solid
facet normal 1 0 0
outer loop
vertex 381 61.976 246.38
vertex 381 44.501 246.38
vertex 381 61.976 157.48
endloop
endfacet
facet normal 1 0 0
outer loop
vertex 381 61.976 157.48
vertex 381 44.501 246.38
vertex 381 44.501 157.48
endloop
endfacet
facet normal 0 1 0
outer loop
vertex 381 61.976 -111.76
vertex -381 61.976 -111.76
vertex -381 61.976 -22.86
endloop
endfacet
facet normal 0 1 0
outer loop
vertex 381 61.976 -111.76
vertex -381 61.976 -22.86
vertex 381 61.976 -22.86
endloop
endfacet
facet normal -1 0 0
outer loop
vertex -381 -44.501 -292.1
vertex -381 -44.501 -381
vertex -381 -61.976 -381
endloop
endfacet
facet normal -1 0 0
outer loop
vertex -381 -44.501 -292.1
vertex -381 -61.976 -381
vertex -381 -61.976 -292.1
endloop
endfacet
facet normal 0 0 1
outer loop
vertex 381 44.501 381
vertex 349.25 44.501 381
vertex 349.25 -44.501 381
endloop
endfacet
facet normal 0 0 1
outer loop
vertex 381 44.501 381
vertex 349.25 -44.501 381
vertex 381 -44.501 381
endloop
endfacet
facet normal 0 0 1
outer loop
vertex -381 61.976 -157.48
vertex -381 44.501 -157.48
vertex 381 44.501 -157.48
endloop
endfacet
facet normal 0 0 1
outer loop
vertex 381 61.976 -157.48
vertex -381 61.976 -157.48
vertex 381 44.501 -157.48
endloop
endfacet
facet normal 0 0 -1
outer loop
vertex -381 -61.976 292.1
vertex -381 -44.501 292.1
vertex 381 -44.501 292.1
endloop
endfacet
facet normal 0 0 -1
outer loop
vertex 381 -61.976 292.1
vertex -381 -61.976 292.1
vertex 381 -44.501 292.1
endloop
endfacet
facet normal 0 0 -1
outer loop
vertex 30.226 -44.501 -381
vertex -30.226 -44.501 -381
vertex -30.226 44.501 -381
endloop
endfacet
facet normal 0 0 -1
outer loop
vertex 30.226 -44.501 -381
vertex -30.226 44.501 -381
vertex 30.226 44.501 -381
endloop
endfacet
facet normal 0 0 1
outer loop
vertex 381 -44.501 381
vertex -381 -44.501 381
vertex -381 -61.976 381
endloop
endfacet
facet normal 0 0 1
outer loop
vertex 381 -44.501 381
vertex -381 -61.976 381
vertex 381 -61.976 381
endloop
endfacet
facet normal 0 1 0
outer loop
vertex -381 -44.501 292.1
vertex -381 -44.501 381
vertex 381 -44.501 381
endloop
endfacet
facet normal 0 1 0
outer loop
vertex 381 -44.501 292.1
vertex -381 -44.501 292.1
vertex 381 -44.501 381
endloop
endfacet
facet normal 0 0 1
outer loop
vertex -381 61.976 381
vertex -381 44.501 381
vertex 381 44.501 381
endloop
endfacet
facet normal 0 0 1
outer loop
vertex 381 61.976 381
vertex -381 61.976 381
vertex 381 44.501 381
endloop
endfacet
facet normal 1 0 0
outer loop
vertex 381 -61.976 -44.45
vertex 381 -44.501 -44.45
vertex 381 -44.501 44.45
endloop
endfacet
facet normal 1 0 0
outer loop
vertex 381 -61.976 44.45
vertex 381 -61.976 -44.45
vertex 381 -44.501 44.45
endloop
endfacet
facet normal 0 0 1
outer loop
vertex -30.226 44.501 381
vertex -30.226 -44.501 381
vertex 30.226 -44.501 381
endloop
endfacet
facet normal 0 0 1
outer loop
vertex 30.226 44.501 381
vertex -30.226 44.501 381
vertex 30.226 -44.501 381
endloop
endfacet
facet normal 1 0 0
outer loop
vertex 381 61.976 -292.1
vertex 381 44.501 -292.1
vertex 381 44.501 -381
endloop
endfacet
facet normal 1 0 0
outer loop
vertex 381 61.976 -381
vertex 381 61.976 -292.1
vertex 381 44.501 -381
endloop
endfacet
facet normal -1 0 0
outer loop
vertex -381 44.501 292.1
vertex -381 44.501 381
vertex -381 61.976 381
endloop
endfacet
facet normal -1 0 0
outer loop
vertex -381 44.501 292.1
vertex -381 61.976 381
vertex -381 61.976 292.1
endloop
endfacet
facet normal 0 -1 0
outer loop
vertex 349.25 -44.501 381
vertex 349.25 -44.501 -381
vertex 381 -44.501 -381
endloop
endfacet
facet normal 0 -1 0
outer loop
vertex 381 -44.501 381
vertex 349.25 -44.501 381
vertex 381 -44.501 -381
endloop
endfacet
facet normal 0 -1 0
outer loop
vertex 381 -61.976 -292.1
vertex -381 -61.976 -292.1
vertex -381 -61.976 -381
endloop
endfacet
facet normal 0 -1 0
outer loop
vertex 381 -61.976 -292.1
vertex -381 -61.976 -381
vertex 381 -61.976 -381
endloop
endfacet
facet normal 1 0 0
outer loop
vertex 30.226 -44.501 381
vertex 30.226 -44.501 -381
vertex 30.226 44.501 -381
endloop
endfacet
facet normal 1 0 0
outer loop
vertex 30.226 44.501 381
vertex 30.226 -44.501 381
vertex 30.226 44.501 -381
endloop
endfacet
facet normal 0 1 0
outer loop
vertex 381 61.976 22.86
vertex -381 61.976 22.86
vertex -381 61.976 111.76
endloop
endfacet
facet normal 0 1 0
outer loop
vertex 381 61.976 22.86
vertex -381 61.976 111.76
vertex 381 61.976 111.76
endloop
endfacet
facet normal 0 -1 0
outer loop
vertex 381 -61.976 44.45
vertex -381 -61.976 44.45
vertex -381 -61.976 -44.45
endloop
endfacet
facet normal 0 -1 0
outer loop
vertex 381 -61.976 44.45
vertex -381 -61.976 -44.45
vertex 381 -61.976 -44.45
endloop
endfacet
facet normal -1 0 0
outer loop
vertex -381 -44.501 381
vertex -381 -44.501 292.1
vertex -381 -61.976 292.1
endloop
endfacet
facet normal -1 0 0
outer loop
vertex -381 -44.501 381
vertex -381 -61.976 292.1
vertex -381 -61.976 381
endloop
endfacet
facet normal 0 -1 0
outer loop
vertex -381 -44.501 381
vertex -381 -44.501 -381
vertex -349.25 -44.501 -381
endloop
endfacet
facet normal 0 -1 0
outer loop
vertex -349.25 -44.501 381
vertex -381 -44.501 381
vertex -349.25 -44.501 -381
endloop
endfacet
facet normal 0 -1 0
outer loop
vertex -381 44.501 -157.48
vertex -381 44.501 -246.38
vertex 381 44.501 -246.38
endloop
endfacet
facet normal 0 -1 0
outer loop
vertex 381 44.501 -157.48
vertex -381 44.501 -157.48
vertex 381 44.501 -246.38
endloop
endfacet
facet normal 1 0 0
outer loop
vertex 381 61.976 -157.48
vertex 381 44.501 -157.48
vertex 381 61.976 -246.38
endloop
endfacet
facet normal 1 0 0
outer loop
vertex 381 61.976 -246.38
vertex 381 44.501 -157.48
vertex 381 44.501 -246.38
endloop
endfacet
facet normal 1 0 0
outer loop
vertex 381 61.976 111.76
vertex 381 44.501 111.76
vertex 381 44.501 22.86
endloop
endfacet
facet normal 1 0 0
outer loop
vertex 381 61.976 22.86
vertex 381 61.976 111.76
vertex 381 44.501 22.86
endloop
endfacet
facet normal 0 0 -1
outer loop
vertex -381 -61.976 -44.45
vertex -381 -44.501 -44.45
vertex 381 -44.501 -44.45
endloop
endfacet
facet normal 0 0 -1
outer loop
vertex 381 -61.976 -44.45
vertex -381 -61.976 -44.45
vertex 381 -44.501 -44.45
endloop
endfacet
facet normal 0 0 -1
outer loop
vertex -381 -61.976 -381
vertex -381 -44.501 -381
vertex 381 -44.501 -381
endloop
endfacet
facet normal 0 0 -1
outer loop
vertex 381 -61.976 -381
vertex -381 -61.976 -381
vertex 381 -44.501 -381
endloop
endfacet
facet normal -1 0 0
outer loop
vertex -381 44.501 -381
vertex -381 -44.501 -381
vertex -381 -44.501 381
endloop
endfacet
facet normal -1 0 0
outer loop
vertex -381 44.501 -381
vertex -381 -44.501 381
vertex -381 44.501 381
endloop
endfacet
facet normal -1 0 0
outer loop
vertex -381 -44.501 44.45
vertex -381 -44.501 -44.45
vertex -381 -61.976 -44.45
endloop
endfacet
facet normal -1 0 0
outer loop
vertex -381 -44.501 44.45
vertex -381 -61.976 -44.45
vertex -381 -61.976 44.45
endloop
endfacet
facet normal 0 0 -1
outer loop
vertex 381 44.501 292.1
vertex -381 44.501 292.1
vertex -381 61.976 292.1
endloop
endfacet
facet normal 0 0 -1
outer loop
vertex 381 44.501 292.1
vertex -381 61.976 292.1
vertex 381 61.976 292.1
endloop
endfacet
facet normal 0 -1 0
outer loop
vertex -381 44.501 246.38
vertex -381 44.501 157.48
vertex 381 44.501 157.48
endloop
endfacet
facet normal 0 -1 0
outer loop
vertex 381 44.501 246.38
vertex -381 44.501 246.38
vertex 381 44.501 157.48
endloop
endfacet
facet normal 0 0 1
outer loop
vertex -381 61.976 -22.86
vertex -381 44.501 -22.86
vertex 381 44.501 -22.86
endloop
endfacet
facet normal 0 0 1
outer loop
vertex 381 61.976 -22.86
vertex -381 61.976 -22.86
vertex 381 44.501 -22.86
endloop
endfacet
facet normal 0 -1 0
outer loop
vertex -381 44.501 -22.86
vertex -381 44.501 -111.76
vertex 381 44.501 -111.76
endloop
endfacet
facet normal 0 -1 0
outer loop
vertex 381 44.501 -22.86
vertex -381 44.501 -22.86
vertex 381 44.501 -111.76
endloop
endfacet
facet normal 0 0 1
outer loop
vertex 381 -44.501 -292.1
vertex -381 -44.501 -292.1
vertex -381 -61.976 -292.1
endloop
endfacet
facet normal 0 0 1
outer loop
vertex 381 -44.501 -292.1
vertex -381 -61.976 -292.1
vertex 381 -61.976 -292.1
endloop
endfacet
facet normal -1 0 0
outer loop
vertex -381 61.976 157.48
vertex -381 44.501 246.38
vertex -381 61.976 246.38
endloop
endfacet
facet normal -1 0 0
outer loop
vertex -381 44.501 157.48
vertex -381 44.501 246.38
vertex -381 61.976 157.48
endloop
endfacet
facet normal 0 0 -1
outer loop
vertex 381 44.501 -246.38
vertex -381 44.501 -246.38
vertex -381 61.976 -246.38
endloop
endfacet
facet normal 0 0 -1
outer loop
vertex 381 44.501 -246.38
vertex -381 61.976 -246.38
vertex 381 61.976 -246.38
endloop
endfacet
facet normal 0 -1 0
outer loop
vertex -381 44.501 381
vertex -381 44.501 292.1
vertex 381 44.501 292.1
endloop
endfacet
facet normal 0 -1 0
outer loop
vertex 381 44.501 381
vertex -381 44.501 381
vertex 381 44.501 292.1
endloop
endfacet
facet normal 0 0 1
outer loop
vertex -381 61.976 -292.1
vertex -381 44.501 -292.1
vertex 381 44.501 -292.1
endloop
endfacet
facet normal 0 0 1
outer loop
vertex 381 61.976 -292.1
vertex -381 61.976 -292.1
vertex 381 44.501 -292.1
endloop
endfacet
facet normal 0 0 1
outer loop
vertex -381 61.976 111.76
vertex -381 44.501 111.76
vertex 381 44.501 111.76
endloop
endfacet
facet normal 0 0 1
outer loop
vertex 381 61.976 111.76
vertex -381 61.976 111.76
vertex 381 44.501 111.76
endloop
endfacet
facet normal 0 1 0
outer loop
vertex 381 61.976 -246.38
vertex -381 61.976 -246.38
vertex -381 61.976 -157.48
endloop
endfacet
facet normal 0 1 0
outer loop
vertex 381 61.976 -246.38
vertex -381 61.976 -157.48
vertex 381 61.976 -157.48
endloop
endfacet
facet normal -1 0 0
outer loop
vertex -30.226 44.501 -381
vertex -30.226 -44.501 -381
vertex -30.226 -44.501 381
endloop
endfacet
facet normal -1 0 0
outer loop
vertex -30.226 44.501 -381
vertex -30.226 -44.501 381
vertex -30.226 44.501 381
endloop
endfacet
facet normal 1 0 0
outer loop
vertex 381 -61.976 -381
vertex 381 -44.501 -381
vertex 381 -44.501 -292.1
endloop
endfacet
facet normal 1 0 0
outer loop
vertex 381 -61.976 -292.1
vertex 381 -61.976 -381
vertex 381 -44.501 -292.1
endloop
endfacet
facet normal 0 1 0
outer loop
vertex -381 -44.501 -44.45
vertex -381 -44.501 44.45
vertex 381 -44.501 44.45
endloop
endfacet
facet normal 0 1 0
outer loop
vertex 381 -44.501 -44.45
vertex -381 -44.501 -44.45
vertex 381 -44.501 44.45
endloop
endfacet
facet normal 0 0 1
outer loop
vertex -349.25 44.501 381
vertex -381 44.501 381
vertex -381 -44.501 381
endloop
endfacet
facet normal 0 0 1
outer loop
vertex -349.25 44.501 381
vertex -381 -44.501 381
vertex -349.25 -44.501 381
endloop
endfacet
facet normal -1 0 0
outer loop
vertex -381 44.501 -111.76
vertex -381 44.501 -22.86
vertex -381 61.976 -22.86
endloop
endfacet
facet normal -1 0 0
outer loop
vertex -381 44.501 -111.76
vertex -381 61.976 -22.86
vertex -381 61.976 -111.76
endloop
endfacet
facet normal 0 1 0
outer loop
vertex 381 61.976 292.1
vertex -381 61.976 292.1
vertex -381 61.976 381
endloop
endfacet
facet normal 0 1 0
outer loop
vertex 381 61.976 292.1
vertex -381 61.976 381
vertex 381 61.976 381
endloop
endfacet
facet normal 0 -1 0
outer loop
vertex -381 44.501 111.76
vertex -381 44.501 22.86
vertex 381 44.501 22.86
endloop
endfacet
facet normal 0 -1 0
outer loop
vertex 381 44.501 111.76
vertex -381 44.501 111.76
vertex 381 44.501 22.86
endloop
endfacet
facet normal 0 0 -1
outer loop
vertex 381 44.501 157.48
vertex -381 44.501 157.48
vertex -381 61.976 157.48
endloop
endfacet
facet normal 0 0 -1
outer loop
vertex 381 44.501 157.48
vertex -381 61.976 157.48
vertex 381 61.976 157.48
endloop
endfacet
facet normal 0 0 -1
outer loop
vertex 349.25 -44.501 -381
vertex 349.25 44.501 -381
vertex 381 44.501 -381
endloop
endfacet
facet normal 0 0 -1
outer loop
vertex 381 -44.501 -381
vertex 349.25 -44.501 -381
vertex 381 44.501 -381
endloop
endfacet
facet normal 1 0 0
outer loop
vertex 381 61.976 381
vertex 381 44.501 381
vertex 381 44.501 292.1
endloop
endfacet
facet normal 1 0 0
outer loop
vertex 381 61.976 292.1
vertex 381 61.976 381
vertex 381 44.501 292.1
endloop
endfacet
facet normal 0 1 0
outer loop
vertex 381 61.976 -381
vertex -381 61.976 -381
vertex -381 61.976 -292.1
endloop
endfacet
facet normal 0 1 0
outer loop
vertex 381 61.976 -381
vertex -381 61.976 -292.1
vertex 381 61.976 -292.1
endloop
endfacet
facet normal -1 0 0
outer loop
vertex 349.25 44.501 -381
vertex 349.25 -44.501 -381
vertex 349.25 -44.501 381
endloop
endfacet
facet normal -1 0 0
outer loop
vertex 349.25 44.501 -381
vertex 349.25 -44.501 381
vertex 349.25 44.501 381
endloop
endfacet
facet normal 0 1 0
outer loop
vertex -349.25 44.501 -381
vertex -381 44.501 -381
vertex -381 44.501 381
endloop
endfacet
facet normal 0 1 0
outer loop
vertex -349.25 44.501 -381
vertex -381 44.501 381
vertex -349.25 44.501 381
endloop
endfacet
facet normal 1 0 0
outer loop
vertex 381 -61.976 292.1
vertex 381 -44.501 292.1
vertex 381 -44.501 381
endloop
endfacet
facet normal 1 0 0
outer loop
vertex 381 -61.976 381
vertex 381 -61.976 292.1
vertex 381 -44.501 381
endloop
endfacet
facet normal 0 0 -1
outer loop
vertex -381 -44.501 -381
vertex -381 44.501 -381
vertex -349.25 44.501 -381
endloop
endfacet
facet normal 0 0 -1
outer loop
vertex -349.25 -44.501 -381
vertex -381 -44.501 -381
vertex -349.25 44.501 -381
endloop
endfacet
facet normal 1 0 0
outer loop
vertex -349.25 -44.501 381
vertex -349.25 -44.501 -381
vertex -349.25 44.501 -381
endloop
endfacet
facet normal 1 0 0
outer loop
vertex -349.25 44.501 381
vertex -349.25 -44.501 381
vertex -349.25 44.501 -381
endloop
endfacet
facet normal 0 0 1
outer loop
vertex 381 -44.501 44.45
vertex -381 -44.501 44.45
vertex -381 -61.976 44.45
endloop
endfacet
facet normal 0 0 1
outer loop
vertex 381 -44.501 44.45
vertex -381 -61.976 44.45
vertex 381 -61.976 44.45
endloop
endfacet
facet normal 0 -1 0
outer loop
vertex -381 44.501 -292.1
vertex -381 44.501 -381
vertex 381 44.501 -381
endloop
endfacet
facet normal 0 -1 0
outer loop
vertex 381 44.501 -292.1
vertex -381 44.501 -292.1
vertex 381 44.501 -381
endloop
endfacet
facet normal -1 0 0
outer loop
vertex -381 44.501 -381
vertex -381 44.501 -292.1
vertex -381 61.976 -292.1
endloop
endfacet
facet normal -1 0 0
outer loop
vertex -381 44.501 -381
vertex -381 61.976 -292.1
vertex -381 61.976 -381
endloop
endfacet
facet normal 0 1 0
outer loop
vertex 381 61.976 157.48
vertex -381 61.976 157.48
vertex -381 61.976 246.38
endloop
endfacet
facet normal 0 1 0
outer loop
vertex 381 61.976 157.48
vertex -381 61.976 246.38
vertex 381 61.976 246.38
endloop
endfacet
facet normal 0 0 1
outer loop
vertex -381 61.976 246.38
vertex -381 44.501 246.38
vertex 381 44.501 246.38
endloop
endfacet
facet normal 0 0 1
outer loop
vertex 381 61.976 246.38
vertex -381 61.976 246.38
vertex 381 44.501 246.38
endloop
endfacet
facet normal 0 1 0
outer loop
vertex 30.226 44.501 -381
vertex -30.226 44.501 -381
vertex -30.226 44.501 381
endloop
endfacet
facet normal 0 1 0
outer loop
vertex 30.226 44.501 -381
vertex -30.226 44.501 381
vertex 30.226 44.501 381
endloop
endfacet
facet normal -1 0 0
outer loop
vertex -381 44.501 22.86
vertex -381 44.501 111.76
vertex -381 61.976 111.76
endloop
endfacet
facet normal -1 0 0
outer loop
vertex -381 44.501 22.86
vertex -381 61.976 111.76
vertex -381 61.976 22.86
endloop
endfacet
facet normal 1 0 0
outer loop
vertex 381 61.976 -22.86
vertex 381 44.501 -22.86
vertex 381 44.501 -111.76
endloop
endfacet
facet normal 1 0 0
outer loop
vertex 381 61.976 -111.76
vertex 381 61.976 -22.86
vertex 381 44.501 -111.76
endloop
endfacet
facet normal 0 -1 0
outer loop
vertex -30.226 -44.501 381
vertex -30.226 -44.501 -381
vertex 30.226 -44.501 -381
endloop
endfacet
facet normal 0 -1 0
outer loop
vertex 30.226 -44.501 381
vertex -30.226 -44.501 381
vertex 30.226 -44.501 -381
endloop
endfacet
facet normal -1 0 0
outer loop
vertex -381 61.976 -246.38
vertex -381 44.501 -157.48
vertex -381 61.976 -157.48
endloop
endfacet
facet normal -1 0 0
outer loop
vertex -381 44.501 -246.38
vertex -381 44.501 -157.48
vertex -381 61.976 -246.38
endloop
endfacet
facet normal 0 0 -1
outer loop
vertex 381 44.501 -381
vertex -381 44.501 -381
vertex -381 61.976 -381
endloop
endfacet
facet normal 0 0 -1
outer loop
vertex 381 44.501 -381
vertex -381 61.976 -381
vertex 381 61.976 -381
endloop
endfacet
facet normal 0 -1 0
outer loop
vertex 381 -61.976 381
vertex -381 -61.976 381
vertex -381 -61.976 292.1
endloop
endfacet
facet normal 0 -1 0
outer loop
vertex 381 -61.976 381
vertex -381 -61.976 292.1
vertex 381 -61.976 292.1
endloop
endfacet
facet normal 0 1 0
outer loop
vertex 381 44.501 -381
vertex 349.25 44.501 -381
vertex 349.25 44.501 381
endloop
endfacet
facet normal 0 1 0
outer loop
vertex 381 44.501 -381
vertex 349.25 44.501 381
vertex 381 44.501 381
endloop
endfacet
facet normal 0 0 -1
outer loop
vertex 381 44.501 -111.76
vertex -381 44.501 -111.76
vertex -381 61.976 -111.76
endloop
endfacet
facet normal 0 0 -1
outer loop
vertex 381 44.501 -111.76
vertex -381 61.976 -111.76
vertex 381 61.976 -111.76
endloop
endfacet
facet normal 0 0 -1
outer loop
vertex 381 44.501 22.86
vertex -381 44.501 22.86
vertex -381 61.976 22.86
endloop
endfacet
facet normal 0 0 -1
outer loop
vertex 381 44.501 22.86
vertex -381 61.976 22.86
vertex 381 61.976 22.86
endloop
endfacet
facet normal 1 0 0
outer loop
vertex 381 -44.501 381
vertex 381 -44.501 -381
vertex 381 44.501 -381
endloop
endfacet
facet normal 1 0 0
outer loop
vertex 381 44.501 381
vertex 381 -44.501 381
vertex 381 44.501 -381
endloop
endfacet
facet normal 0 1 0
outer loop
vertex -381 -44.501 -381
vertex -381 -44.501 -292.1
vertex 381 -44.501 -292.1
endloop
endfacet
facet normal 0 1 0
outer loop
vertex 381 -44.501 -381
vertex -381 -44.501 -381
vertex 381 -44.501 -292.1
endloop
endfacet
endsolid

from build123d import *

# Parameters (mm, degrees)
BOSS_EXTRUDE1_DEPTH        = 381
BOSS_EXTRUDE1_DEPTH_BACK   = 381
SKETCH3_W                  = 31.75
SKETCH3_H                  = 89.0016
BOSS_EXTRUDE1_2_DEPTH      = 381
BOSS_EXTRUDE1_2_DEPTH_BACK = 381
SKETCH3_W_2                = 60.452
BOSS_EXTRUDE1_3_DEPTH      = 381
BOSS_EXTRUDE1_3_DEPTH_BACK = 381
SKETCH4_W                  = 762
SKETCH4_H                  = 88.9
BOSS_EXTRUDE2_DEPTH        = 17.4752
BOSS_EXTRUDE2_2_DEPTH      = 17.4752
BOSS_EXTRUDE2_3_DEPTH      = 17.4752
BOSS_EXTRUDE2_4_DEPTH      = 17.4752
BOSS_EXTRUDE2_5_DEPTH      = 17.4752
BOSS_EXTRUDE2_6_DEPTH      = 17.4752
SKETCH5_W                  = 762
SKETCH5_H                  = 88.9
BOSS_EXTRUDE3_DEPTH        = 17.4752
BOSS_EXTRUDE3_2_DEPTH      = 17.4752
BOSS_EXTRUDE3_3_DEPTH      = 17.4752


with BuildPart() as part:
    # Sketch3 → Boss-Extrude1 (new, two sides: drawn at the far end of the back side and taken through both)
    with BuildSketch(Plane.XY.offset(-BOSS_EXTRUDE1_DEPTH_BACK)):
        with Locations((-365.125, 0)):
            Rectangle(SKETCH3_W, SKETCH3_H)
    extrude(amount=BOSS_EXTRUDE1_DEPTH + BOSS_EXTRUDE1_DEPTH_BACK)


with BuildPart() as body_2:
    # Sketch3 → Boss-Extrude1 2 (new, two sides: drawn at the far end of the back side and taken through both)
    with BuildSketch(Plane.XY.offset(-BOSS_EXTRUDE1_2_DEPTH_BACK)):
        Rectangle(SKETCH3_W_2, SKETCH3_H)
    extrude(amount=BOSS_EXTRUDE1_2_DEPTH + BOSS_EXTRUDE1_2_DEPTH_BACK)


with BuildPart() as body_3:
    # Sketch3 → Boss-Extrude1 3 (new, two sides: drawn at the far end of the back side and taken through both)
    with BuildSketch(Plane.XY.offset(-BOSS_EXTRUDE1_3_DEPTH_BACK)):
        with Locations((365.125, 0)):
            Rectangle(SKETCH3_W, SKETCH3_H)
    extrude(amount=BOSS_EXTRUDE1_3_DEPTH + BOSS_EXTRUDE1_3_DEPTH_BACK)


with BuildPart() as body_4:
    # Sketch4 → Boss-Extrude2 (new body)
    with BuildSketch(Plane(origin=(0, 44.5008, 0), x_dir=(1, 0, 0), z_dir=(0, 1, 0))):
        with Locations((0, -336.55)):
            Rectangle(SKETCH4_W, SKETCH4_H)
    extrude(amount=BOSS_EXTRUDE2_DEPTH)


with BuildPart() as body_5:
    # Sketch4 → Boss-Extrude2 2 (new body)
    with BuildSketch(Plane(origin=(0, 44.5008, 0), x_dir=(1, 0, 0), z_dir=(0, 1, 0))):
        with Locations((0, -201.93)):
            Rectangle(SKETCH4_W, SKETCH4_H)
    extrude(amount=BOSS_EXTRUDE2_2_DEPTH)


with BuildPart() as body_6:
    # Sketch4 → Boss-Extrude2 3 (new body)
    with BuildSketch(Plane(origin=(0, 44.5008, 0), x_dir=(1, 0, 0), z_dir=(0, 1, 0))):
        with Locations((0, -67.31)):
            Rectangle(SKETCH4_W, SKETCH4_H)
    extrude(amount=BOSS_EXTRUDE2_3_DEPTH)


with BuildPart() as body_7:
    # Sketch4 → Boss-Extrude2 4 (new body)
    with BuildSketch(Plane(origin=(0, 44.5008, 0), x_dir=(1, 0, 0), z_dir=(0, 1, 0))):
        with Locations((0, 67.31)):
            Rectangle(SKETCH4_W, SKETCH4_H)
    extrude(amount=BOSS_EXTRUDE2_4_DEPTH)


with BuildPart() as body_8:
    # Sketch4 → Boss-Extrude2 5 (new body)
    with BuildSketch(Plane(origin=(0, 44.5008, 0), x_dir=(1, 0, 0), z_dir=(0, 1, 0))):
        with Locations((0, 201.93)):
            Rectangle(SKETCH4_W, SKETCH4_H)
    extrude(amount=BOSS_EXTRUDE2_5_DEPTH)


with BuildPart() as body_9:
    # Sketch4 → Boss-Extrude2 6 (new body)
    with BuildSketch(Plane(origin=(0, 44.5008, 0), x_dir=(1, 0, 0), z_dir=(0, 1, 0))):
        with Locations((0, 336.55)):
            Rectangle(SKETCH4_W, SKETCH4_H)
    extrude(amount=BOSS_EXTRUDE2_6_DEPTH)


with BuildPart() as body_10:
    # Sketch5 → Boss-Extrude3 (new body)
    with BuildSketch(Plane.XZ.offset(44.5008)):
        with Locations((0, 336.55)):
            Rectangle(SKETCH5_W, SKETCH5_H)
    extrude(amount=BOSS_EXTRUDE3_DEPTH)


with BuildPart() as body_11:
    # Sketch5 → Boss-Extrude3 2 (new body)
    with BuildSketch(Plane.XZ.offset(44.5008)):
        with Locations((0, -336.55)):
            Rectangle(SKETCH5_W, SKETCH5_H)
    extrude(amount=BOSS_EXTRUDE3_2_DEPTH)


with BuildPart() as body_12:
    # Sketch5 → Boss-Extrude3 3 (new body)
    with BuildSketch(Plane.XZ.offset(44.5008)):
        Rectangle(SKETCH5_W, SKETCH5_H)
    extrude(amount=BOSS_EXTRUDE3_3_DEPTH)


solid = Compound([part.part, body_2.part, body_3.part, body_4.part, body_5.part, body_6.part, body_7.part, body_8.part, body_9.part, body_10.part, body_11.part, body_12.part])
